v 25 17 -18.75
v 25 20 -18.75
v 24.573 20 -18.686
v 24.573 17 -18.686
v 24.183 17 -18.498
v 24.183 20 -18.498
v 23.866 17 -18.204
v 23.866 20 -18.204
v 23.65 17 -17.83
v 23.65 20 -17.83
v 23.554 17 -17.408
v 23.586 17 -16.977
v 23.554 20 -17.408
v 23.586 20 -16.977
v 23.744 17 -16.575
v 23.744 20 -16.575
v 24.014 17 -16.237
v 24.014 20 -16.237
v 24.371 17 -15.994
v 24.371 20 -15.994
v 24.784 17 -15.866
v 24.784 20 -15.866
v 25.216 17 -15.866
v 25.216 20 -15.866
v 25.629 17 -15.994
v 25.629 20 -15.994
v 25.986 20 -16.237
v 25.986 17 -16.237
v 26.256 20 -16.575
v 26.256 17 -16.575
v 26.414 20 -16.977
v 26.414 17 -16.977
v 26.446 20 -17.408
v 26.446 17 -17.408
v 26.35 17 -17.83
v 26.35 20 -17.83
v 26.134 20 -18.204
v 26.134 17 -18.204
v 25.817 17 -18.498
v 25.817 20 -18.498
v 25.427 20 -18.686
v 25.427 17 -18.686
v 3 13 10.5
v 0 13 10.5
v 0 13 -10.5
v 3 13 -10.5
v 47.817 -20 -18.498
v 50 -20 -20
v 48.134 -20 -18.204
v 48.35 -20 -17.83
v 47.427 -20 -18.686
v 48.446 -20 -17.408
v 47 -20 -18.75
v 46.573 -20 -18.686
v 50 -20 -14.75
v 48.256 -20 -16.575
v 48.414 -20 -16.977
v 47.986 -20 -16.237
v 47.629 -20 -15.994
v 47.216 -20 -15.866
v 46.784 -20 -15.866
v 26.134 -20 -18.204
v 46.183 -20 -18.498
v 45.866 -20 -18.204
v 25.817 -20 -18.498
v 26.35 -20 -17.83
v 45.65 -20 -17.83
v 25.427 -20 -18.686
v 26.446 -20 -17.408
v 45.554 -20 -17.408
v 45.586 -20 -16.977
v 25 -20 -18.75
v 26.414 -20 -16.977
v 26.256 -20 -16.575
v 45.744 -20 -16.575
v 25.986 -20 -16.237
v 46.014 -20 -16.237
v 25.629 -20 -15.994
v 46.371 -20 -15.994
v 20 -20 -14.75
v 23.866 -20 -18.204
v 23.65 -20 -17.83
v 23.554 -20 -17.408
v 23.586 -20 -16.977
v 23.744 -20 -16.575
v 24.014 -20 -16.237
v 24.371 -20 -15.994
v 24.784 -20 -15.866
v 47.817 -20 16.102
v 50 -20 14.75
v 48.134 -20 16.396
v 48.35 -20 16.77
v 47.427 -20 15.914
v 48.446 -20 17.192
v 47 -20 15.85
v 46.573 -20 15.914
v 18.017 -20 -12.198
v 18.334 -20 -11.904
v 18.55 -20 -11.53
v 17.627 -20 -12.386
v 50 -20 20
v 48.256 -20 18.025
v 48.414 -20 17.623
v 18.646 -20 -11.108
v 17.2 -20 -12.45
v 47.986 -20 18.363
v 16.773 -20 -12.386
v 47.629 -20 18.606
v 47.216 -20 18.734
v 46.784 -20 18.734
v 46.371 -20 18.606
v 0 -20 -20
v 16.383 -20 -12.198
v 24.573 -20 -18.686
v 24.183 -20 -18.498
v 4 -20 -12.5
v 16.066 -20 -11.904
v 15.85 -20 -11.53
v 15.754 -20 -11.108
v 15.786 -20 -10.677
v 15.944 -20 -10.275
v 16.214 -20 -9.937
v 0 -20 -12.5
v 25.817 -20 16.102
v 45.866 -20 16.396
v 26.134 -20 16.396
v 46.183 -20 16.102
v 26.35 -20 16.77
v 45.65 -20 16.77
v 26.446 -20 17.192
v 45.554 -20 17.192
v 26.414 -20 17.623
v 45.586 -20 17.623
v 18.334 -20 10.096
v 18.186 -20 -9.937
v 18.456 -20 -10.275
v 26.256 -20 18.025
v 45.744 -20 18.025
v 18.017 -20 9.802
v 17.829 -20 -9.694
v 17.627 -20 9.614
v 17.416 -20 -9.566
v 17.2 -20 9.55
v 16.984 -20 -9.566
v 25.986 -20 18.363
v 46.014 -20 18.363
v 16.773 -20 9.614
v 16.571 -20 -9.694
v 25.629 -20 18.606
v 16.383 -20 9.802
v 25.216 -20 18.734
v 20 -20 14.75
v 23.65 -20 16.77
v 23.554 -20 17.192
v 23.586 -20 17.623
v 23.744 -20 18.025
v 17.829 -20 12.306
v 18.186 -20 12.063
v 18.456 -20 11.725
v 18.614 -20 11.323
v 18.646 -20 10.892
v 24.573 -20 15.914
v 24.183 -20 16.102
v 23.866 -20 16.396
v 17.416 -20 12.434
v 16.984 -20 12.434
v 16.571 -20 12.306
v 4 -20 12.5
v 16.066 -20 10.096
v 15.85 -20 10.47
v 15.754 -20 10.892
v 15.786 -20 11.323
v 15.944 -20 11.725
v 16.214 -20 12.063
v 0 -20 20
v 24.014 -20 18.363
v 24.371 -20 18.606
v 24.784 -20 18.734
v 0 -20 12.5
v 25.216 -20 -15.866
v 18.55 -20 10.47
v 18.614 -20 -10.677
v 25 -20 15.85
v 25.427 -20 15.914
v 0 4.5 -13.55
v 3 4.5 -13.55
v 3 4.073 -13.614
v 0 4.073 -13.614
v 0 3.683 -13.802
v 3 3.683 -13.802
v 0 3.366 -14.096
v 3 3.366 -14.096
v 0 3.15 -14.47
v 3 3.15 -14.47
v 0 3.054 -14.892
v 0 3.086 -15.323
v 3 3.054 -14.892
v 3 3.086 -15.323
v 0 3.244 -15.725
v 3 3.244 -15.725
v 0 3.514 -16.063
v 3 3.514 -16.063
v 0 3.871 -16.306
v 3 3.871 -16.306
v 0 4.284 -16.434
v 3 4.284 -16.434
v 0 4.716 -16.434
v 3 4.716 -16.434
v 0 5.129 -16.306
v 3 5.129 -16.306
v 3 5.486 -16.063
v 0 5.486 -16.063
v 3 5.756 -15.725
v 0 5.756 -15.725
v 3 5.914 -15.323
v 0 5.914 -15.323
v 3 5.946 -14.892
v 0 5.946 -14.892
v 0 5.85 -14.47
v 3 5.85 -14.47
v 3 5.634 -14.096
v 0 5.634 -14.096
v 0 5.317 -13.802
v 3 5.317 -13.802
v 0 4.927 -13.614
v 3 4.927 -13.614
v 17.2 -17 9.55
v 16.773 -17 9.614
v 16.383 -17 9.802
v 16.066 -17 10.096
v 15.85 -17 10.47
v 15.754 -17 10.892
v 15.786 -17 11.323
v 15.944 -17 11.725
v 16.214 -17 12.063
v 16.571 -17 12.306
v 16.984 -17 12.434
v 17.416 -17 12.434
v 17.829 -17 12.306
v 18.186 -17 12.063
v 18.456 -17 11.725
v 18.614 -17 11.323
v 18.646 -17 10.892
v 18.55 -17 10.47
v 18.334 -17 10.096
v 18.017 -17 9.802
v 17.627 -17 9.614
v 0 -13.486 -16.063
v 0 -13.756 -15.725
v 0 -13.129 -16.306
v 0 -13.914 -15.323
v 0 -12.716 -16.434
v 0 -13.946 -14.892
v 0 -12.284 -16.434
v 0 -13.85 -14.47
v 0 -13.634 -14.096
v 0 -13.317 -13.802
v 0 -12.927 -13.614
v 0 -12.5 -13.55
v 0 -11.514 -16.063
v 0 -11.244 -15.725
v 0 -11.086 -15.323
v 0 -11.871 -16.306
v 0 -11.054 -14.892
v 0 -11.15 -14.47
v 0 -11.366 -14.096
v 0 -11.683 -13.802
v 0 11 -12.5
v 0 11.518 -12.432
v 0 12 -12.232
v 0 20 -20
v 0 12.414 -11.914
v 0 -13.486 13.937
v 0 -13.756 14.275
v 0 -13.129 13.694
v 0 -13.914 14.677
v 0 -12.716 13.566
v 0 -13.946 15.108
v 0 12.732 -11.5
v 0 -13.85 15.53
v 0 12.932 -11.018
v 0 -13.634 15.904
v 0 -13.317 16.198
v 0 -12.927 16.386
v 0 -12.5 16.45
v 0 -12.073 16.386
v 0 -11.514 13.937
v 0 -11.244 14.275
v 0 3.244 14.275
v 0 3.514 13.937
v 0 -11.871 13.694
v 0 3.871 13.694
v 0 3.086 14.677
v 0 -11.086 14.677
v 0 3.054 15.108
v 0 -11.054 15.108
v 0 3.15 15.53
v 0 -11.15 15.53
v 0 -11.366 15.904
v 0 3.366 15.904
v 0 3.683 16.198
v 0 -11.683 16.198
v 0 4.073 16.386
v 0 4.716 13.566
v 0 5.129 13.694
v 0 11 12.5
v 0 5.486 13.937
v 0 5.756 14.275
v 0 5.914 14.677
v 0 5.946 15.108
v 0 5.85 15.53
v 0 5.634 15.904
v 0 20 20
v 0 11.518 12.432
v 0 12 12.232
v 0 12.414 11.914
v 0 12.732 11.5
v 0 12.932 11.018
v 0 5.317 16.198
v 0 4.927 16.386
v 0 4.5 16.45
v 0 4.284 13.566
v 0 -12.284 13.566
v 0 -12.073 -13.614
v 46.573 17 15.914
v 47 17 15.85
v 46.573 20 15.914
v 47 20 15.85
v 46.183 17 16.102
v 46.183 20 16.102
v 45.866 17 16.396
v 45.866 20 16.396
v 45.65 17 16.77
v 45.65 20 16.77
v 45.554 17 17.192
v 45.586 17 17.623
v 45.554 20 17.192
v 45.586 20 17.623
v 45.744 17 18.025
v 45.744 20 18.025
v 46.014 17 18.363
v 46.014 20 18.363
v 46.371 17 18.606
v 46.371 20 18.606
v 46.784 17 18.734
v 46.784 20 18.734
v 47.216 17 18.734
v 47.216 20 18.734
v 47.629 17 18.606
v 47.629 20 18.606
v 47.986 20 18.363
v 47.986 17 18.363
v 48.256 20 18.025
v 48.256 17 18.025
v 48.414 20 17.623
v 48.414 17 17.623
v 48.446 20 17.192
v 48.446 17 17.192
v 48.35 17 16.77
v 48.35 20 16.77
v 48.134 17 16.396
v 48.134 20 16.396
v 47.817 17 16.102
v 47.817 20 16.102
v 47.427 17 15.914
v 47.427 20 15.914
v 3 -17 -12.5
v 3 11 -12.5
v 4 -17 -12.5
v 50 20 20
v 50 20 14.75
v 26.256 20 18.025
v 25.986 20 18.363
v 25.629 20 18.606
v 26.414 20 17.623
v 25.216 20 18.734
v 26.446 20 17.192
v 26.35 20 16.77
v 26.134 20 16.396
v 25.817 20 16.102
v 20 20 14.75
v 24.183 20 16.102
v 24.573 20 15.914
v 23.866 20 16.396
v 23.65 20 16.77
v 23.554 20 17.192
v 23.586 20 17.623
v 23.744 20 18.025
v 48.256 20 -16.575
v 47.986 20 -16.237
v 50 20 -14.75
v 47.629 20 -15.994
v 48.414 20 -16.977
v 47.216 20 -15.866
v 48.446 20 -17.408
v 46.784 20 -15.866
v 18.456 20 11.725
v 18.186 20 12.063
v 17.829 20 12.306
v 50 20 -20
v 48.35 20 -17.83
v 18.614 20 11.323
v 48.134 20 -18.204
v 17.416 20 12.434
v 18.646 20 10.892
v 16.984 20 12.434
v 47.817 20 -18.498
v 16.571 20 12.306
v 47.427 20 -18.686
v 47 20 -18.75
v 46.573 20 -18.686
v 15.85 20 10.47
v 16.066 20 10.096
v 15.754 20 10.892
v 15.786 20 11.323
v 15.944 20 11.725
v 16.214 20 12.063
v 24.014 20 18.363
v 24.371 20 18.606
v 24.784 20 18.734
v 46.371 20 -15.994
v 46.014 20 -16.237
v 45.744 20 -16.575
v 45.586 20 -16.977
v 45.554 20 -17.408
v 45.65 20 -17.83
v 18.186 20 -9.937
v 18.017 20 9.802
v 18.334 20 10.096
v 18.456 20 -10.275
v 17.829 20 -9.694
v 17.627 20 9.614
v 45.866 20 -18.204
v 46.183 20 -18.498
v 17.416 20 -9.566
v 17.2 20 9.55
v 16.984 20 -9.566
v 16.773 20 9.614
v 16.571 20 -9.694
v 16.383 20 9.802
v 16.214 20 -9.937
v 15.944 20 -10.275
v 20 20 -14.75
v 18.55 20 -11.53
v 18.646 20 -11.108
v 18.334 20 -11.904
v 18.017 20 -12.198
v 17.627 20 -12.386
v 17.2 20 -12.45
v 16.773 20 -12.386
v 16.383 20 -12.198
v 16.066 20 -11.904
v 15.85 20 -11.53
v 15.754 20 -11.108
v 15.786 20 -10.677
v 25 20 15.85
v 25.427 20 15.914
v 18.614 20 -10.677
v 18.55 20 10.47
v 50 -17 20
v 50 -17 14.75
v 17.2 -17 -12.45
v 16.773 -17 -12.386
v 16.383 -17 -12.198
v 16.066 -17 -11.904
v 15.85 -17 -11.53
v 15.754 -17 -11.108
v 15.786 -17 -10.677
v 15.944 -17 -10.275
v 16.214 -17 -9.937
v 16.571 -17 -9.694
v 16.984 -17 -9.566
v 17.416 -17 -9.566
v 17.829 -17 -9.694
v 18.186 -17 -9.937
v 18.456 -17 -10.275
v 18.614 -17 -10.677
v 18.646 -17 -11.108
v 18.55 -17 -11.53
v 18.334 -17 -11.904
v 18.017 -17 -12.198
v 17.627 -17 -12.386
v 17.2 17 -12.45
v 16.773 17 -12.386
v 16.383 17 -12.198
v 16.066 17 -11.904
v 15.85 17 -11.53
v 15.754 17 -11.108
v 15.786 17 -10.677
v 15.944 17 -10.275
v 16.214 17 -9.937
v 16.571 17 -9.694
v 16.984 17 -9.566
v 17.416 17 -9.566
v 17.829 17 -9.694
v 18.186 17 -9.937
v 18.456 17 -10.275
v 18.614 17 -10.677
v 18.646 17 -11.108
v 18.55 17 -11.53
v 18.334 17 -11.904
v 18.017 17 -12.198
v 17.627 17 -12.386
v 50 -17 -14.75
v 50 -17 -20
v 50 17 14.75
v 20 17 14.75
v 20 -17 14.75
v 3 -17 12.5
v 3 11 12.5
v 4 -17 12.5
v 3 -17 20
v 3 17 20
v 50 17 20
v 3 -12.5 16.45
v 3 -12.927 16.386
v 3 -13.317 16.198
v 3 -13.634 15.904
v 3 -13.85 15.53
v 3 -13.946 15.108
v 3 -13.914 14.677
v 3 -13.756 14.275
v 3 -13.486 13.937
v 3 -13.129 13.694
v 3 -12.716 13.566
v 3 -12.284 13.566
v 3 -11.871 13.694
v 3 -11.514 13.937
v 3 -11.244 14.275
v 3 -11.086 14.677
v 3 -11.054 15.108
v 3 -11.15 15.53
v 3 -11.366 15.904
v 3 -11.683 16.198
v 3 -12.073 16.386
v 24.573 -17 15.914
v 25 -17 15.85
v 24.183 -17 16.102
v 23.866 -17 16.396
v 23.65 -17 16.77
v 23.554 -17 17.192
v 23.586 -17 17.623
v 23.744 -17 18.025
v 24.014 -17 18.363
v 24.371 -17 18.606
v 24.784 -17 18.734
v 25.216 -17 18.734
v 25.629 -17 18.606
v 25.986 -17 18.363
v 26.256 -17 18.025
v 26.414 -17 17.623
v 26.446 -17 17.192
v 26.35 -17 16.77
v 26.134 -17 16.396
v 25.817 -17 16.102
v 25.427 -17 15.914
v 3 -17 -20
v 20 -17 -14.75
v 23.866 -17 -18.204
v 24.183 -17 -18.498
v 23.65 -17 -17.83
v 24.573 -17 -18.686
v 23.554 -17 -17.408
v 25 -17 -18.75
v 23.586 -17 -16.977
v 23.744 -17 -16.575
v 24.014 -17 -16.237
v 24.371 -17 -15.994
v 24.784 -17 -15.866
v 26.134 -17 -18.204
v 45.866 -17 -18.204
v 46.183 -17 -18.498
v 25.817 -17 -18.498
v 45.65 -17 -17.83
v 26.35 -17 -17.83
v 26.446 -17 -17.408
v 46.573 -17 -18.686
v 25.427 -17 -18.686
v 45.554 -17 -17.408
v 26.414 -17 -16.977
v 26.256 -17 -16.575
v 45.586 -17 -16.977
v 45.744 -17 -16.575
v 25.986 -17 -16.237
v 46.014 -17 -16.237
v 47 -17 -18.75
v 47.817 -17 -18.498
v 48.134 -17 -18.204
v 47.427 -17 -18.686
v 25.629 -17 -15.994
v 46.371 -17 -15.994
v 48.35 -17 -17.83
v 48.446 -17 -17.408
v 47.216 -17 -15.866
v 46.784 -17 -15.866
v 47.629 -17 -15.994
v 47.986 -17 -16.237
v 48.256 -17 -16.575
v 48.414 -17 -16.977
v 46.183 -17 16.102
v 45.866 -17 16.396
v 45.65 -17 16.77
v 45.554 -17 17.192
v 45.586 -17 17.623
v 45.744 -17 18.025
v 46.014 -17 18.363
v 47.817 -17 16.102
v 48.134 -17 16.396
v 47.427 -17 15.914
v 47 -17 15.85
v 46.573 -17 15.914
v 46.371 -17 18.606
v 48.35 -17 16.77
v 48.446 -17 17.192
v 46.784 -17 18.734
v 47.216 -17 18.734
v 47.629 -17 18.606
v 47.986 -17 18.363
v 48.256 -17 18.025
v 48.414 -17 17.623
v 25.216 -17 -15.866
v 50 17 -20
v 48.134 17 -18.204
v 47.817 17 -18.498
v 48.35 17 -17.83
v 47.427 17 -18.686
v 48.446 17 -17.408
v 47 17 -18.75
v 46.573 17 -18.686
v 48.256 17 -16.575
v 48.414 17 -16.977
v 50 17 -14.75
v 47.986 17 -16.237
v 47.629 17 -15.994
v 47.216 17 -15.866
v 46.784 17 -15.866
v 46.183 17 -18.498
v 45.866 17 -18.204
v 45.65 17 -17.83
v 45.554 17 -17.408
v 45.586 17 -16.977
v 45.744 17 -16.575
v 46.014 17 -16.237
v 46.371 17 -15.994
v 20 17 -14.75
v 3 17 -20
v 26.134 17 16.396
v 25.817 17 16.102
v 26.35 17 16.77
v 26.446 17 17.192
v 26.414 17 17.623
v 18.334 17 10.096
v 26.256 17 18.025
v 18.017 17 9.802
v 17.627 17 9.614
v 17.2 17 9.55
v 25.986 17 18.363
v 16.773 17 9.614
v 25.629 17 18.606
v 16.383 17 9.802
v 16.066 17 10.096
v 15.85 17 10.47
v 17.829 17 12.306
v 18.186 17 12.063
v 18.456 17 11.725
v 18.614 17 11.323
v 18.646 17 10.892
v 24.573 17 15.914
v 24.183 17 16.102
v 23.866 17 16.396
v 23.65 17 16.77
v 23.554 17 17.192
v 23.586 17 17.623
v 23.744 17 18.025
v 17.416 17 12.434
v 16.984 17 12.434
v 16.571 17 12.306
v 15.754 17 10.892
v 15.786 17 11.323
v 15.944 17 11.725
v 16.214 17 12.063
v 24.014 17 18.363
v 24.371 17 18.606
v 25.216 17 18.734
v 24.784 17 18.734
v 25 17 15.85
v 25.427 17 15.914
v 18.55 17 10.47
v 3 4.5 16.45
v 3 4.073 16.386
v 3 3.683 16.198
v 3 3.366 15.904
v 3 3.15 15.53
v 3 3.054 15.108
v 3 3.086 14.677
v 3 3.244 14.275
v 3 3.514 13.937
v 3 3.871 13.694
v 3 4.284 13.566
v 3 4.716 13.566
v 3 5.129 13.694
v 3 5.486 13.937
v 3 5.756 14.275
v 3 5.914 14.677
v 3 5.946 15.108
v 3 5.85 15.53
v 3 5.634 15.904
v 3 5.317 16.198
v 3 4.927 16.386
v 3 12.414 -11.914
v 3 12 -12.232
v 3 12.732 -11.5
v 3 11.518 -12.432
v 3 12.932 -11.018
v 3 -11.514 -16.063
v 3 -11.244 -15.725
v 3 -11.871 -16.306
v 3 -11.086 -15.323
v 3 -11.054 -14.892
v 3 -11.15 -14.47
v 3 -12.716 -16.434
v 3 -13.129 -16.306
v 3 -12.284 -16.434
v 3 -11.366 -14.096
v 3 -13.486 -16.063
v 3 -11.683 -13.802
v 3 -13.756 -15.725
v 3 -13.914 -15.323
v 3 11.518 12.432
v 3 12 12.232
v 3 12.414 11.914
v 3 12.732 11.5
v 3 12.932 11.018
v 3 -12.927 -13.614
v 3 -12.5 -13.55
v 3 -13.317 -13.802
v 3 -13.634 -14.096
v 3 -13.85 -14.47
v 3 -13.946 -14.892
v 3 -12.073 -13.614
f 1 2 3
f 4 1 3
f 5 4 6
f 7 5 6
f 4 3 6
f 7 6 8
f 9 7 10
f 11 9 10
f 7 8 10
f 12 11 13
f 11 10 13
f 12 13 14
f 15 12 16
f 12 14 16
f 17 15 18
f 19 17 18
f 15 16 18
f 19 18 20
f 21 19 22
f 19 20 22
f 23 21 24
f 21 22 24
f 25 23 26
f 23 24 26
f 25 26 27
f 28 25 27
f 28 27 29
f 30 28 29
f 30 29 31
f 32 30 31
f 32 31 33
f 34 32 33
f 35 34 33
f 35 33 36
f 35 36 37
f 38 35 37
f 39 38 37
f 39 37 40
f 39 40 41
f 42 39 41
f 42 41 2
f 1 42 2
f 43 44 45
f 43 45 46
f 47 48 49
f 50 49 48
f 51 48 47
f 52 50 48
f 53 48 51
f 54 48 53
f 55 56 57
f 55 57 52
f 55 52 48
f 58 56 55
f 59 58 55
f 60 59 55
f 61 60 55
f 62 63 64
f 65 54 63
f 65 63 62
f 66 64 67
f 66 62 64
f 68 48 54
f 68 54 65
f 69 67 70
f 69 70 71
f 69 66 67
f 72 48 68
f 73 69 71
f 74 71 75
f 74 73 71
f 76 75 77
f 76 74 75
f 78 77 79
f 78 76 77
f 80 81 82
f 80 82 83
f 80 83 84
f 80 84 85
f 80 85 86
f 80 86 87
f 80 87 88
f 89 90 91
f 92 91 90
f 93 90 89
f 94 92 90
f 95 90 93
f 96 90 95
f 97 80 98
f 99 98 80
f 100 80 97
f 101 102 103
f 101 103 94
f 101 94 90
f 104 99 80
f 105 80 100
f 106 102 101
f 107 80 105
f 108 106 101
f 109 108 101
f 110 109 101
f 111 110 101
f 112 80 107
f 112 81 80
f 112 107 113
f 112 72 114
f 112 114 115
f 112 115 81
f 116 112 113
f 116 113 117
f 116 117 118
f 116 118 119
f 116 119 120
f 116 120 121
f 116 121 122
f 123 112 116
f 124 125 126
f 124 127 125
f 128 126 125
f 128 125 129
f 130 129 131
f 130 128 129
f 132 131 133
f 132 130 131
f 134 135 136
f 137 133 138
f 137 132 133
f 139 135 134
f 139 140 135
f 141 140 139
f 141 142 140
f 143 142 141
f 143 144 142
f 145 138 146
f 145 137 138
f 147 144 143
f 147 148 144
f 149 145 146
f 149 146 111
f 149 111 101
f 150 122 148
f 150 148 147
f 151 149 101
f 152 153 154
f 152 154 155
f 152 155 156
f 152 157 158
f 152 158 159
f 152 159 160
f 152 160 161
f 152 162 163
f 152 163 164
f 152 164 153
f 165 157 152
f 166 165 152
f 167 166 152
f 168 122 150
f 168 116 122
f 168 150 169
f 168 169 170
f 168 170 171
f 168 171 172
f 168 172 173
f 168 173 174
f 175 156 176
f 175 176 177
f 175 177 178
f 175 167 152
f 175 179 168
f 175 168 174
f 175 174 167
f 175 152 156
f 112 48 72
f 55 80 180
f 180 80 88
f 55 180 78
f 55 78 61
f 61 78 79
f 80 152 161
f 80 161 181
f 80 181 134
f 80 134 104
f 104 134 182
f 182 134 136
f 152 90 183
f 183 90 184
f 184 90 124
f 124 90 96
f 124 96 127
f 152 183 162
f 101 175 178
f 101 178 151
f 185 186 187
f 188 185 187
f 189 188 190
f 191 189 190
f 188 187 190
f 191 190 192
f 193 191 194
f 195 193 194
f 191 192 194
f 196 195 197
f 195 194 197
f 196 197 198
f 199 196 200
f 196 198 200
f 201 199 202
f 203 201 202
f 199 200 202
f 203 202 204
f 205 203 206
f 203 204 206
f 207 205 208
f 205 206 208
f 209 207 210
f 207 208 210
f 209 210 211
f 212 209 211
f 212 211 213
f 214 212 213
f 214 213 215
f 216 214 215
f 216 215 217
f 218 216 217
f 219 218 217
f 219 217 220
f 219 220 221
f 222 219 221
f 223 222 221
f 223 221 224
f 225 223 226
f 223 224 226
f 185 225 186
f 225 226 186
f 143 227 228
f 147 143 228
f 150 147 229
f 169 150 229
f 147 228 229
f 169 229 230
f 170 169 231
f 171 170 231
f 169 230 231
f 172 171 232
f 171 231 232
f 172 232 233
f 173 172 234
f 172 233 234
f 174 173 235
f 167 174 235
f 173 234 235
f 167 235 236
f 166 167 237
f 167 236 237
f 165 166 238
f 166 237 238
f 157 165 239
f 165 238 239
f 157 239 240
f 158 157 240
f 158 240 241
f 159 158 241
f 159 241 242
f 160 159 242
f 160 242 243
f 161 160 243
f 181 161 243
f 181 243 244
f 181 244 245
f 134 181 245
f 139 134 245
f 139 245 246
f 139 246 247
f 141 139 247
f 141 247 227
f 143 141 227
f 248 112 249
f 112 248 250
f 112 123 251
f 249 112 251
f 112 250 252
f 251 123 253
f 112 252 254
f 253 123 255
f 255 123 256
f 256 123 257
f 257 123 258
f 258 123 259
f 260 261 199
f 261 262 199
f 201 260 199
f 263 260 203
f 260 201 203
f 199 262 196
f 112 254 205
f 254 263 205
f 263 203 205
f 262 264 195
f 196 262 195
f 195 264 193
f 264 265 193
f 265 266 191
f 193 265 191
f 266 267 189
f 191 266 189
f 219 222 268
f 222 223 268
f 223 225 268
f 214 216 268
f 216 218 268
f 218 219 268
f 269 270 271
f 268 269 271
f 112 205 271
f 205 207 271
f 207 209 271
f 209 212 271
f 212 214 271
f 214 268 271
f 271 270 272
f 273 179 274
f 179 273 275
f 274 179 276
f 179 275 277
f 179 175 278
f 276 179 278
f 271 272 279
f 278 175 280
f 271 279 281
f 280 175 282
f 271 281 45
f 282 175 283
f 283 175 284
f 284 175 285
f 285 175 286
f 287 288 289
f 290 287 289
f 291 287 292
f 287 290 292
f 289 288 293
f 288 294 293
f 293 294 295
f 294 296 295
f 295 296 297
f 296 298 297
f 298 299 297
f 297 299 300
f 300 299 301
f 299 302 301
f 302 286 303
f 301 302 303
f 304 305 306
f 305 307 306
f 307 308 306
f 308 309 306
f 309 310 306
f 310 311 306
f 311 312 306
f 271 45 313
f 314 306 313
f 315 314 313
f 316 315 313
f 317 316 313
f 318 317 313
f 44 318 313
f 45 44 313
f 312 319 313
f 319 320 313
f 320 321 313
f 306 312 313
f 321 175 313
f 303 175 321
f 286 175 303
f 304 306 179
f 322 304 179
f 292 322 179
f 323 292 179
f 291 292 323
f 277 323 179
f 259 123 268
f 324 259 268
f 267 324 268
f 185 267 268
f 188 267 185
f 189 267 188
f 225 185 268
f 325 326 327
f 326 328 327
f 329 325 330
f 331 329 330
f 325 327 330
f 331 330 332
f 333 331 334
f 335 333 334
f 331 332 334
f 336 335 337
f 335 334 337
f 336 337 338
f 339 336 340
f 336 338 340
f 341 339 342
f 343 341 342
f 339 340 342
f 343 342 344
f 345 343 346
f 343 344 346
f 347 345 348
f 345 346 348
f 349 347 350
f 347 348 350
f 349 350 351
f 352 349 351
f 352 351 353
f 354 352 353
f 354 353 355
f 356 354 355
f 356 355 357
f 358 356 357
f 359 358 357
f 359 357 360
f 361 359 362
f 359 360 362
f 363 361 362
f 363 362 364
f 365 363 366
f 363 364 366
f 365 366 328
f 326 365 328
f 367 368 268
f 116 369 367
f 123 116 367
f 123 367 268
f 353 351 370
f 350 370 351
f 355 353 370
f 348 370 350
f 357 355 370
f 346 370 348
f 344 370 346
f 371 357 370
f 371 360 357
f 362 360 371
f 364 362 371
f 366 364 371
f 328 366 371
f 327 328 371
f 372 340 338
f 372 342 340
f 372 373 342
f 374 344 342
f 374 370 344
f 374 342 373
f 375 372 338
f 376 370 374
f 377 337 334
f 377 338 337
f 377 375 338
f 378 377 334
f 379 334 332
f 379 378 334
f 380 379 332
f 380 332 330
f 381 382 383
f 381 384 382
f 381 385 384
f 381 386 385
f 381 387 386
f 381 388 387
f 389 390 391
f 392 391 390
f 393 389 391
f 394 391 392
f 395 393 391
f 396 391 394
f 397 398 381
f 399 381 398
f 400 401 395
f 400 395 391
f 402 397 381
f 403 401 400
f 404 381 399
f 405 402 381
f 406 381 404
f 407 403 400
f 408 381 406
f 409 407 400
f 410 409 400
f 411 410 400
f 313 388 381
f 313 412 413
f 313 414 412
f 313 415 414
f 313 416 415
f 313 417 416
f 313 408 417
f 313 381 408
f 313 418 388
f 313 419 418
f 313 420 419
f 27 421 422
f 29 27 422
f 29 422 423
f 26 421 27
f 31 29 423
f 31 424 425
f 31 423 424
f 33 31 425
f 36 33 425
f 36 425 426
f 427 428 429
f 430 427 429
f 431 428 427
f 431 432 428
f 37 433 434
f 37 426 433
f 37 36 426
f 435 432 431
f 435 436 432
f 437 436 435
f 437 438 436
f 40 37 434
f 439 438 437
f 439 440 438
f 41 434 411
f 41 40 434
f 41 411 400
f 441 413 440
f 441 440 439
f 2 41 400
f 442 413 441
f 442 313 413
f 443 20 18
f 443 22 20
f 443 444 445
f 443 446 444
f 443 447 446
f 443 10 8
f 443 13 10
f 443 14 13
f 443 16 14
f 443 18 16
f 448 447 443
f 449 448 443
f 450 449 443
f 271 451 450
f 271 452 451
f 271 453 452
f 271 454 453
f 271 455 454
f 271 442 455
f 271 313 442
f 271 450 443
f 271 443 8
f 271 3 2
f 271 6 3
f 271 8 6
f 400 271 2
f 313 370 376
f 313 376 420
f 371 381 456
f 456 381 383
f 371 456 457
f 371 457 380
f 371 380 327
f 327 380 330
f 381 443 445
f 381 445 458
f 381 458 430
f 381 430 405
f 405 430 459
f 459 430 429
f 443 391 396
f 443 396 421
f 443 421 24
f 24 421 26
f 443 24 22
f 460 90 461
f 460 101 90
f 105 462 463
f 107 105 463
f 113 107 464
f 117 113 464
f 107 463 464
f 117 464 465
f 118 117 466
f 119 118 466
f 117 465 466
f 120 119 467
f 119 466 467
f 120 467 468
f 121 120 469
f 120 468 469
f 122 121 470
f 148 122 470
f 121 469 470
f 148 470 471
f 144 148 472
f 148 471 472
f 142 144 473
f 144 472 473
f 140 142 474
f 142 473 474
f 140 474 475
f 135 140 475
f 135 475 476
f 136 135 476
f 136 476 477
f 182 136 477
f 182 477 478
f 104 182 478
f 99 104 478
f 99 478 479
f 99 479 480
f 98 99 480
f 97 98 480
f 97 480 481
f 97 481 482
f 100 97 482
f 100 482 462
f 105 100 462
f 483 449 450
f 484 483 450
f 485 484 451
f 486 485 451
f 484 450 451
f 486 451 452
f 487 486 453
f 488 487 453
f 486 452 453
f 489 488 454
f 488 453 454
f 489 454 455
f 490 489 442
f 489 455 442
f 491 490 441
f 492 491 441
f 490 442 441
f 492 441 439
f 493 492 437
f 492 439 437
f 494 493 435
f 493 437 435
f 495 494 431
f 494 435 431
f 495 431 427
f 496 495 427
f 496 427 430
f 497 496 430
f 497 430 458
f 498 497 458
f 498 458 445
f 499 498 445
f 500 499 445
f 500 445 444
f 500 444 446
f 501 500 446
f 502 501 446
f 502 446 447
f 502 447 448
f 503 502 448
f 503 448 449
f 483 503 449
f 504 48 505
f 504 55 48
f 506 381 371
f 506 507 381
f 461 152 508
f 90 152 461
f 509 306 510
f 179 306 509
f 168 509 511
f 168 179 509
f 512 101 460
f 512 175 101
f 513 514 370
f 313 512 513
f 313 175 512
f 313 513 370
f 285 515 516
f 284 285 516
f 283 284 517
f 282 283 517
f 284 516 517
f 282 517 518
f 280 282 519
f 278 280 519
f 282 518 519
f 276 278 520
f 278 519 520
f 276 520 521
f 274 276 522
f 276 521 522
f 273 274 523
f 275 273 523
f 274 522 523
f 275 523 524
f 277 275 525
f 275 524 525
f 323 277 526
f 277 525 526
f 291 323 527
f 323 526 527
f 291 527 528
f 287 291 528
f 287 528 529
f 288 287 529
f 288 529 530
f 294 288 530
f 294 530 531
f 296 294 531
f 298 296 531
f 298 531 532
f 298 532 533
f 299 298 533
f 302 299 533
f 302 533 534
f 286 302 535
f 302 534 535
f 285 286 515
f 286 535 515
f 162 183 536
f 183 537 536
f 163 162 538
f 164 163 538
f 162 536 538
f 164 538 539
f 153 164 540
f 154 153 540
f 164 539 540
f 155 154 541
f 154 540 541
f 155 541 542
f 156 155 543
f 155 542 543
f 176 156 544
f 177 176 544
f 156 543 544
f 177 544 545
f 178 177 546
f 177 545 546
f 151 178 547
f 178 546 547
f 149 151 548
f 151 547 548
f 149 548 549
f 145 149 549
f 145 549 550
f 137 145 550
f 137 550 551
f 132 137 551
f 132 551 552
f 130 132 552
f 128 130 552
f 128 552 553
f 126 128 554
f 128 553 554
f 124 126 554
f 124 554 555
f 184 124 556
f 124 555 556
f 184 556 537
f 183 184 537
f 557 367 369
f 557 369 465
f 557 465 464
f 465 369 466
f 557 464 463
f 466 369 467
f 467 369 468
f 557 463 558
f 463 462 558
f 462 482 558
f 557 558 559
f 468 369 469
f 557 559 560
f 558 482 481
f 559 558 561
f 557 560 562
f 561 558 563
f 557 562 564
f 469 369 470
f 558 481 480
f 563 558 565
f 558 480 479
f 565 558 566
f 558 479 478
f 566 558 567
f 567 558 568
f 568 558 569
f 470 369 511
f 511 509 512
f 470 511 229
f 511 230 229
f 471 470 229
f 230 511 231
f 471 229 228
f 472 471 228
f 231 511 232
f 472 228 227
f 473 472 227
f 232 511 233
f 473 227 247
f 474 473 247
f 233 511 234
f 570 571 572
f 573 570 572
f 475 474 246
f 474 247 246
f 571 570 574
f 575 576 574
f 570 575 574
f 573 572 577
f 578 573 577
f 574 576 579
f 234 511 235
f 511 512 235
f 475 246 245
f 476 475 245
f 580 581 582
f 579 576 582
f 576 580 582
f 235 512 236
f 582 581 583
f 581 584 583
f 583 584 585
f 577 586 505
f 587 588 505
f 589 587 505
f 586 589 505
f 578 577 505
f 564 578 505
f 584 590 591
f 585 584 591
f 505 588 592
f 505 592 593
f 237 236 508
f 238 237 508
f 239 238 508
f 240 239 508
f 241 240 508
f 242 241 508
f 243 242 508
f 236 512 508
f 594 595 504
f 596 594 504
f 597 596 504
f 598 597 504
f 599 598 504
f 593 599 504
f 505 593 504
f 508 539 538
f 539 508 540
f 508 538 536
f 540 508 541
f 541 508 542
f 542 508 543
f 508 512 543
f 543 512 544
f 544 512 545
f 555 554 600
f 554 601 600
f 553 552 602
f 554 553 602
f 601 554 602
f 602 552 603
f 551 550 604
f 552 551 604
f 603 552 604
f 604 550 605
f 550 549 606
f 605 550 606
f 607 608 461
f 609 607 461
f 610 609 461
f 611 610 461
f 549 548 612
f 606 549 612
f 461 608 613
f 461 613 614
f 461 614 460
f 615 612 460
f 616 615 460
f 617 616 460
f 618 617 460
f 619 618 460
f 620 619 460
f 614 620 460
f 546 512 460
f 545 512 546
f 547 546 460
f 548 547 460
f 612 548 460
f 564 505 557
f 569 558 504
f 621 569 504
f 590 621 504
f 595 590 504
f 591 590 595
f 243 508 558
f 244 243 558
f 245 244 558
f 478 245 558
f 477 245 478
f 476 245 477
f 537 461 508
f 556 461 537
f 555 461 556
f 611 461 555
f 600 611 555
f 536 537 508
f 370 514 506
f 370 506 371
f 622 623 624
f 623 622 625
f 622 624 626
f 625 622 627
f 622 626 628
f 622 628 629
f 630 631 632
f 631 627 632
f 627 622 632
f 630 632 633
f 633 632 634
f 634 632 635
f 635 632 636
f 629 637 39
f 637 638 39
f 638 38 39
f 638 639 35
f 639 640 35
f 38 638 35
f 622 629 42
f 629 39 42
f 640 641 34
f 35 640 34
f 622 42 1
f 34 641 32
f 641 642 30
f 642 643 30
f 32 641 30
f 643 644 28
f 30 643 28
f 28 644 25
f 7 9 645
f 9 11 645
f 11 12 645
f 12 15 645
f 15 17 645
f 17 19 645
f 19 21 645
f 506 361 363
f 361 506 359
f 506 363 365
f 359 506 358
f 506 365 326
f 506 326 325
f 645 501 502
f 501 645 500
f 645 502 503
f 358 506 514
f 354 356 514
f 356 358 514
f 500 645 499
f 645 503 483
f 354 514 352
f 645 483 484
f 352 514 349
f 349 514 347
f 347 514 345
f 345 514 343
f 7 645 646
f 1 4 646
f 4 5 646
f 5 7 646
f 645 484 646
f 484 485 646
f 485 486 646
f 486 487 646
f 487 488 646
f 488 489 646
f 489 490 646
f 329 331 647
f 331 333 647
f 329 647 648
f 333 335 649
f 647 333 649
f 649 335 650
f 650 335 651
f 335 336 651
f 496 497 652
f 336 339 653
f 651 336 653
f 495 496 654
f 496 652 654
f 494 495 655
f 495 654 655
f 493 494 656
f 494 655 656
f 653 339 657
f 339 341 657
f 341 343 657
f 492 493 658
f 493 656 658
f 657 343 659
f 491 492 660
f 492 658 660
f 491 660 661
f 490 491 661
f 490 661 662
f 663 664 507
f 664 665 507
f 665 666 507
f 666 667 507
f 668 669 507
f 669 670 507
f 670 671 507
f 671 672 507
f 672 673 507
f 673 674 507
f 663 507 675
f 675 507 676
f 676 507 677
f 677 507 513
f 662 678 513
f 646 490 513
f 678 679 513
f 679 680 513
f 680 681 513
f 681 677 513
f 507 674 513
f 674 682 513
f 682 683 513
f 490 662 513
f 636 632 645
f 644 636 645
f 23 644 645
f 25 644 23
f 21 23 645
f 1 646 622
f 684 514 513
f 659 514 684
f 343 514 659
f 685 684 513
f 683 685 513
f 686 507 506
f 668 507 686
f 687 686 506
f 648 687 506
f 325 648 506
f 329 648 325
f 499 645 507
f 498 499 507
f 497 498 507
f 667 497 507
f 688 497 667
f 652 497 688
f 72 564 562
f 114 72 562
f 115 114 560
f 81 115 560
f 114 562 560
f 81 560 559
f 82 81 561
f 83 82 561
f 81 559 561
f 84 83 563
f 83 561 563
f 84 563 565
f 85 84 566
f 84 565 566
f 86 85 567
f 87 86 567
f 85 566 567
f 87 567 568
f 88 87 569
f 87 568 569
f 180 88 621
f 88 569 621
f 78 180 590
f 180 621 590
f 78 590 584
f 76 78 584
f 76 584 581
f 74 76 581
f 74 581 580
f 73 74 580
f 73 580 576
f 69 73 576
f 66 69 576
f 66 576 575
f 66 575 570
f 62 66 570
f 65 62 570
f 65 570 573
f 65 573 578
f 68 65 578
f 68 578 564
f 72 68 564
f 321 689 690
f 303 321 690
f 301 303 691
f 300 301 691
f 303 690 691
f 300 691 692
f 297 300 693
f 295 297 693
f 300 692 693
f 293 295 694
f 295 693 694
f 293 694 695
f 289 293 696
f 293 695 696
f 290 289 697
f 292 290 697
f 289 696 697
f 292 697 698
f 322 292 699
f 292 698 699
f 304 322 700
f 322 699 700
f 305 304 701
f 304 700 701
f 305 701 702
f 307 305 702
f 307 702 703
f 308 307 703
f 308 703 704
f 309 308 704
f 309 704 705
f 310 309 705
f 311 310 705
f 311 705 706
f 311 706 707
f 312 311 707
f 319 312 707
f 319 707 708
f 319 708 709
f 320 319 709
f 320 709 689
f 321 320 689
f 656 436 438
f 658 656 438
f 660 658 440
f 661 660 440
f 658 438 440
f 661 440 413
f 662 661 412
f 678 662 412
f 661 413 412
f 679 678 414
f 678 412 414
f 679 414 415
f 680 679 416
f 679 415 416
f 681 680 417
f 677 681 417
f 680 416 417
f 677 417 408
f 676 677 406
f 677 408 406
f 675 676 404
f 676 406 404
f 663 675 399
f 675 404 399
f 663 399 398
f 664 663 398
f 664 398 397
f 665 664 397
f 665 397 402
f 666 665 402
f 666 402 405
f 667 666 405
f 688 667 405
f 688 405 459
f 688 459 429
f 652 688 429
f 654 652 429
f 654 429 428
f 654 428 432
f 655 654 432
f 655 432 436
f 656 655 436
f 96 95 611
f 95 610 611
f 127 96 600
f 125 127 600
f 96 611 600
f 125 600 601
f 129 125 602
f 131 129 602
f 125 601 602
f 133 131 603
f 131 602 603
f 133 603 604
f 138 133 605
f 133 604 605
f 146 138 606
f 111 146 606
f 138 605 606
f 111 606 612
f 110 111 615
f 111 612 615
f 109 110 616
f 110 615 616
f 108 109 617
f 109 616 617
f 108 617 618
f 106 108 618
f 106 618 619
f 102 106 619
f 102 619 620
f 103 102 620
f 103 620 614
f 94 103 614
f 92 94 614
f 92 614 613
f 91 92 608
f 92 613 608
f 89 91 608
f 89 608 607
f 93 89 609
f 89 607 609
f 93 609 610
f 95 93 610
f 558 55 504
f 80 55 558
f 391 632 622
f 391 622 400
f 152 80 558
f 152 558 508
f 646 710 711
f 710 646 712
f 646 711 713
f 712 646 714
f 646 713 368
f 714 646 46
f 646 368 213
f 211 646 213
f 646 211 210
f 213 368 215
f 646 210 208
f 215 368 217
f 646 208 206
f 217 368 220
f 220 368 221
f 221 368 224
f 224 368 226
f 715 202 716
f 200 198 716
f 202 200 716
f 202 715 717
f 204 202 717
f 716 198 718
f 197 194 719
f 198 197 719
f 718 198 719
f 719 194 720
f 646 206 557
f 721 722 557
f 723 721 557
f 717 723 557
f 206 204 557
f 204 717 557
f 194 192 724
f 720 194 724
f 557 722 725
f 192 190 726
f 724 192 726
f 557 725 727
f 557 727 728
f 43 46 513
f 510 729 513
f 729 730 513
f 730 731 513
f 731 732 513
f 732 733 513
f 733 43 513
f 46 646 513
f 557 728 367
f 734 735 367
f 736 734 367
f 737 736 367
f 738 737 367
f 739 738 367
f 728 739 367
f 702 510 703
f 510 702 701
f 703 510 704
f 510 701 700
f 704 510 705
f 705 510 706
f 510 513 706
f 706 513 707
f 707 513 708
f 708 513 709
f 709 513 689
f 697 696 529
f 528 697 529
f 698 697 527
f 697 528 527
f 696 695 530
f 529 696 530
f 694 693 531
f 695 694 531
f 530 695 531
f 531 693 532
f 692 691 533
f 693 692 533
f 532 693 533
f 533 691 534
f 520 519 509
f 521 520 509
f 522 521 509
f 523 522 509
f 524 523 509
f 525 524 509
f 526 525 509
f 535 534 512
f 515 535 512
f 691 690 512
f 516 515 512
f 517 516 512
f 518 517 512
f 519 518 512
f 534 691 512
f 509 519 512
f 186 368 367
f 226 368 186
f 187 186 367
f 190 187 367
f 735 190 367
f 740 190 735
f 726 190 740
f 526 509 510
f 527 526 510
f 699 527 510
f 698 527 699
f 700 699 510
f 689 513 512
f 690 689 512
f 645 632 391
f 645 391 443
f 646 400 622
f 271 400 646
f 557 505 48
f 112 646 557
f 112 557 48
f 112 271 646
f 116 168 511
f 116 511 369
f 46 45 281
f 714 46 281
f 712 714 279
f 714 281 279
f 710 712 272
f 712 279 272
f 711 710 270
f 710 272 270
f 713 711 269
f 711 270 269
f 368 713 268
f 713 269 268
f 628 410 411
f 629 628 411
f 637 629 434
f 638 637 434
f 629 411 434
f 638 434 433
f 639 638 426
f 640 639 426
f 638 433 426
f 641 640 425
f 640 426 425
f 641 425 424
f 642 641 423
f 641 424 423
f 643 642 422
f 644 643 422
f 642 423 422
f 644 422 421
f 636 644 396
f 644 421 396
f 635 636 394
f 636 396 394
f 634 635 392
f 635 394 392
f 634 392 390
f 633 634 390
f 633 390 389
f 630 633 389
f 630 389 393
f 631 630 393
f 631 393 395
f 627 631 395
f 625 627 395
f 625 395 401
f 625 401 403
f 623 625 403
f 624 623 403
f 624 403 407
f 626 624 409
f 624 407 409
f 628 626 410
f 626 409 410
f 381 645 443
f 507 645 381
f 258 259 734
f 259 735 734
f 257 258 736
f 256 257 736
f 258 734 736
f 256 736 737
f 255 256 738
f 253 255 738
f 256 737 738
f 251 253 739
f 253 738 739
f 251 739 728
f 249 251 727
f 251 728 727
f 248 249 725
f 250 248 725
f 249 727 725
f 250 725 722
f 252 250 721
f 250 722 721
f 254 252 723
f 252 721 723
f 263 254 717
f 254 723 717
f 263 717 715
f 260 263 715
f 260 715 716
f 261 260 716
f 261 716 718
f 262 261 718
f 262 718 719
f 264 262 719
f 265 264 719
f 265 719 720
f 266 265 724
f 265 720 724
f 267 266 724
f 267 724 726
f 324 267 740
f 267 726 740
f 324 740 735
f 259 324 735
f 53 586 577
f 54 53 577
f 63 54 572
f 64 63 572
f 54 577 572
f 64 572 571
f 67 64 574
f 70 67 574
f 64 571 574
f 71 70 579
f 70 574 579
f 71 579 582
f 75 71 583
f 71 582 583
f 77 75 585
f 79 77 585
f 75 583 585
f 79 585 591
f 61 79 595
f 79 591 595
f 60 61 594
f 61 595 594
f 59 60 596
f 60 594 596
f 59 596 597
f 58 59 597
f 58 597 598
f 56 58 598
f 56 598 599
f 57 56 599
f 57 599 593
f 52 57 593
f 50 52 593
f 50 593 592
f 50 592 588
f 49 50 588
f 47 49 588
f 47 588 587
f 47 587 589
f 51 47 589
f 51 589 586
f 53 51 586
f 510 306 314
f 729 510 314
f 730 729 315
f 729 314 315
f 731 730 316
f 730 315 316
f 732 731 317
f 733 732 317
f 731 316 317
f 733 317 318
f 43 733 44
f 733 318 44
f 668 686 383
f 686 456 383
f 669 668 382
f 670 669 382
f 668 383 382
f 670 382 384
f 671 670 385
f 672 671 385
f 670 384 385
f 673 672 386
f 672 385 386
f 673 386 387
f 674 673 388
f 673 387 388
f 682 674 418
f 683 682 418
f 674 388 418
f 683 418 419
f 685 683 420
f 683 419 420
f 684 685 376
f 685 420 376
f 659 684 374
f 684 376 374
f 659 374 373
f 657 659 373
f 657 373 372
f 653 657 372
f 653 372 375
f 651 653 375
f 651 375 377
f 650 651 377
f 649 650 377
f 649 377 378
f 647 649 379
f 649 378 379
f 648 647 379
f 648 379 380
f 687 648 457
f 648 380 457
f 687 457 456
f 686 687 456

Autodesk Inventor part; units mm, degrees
ref_plane "YZ Plane" through (0, 0, 0) normal (1, 0, 0) x (0, 1, 0)
ref_plane "XZ Plane" through (0, 0, 0) normal (0, 1, 0) x (-1, 0, 0)
ref_plane "XY Plane" through (0, 0, 0) normal (0, 0, 1) x (1, 0, 0)
sketch "Skizze1" plane through (0, 0, 0) normal (1, 0, 0) x (0, 1, 0)
  line L0 (-20, 20) -> (20, 20)
  line L1 (20, 20) -> (20, -20)
  line L2 (20, -20) -> (-20, -20)
  line L3 (-20, -20) -> (-20, 20)
  line L4 (-20, 20) -> (20, -20) construction
  line L5 (20, 20) -> (-20, -20) construction
  point P0 (0, 0)
  dimension "d0" = 40
  dimension "d1" = 40
extrude "Extrusion1" add sketch "Skizze1" along normal blind 50
sketch "Skizze2" plane through (0, -20, 20) normal (0, 0, 1) x (1, 0, 0)
  line L0 (0, 0) -> (0, 40) projected
  line L1 (0, 0) -> (50, 0) projected
  line L2 (50, 40) -> (50, 0) projected
  line L3 (0, 40) -> (50, 40) projected
  line L4 (50, 40) -> (50, 0) projected
  line L5 (50, 37) -> (3, 37)
  line L6 (3, 37) -> (3, 3)
  line L7 (3, 3) -> (50, 3)
  line L8 (50, 3) -> (50, 37)
  point P0 (0, 20)
  dimension "d4" = 3
  dimension "d5" = 3
  dimension "d6" = 3
extrude "Extrusion2" cut sketch "Skizze2" against normal through all contours L7 L6 L5 L2
sketch "Skizze3" plane through (0, -20, -20) normal (0, -1, 0) x (1, 0, 0)
  line L0 (0, 0) -> (0, 40) projected
  line L1 (0, 0) -> (50, 0) projected
  line L2 (50, 40) -> (50, 0) projected
  line L3 (0, 40) -> (50, 40) projected
  line L4 (0, 20) -> (44.7617, 20) construction
  line L5 (20, 34.75) -> (50, 34.75)
  line L6 (50, 34.75) -> (50, 5.25)
  line L7 (50, 5.25) -> (20, 5.25)
  line L8 (20, 5.25) -> (20, 34.75)
  line L9 (20, 34.75) -> (50, 5.25) construction
  line L10 (50, 34.75) -> (20, 5.25) construction
  point P0 (35, 20)
  dimension "d9" = 29.5
  dimension "d10" = 30
extrude "Extrusion3" cut sketch "Skizze3" against normal blind 40 contours L7 L8 L5 L2
sketch "Skizze4" plane through (0, -20, -20) normal (0, -1, 0) x (1, 0, 0)
  line L0 (50, 5.25) -> (20, 5.25) projected
  line L1 (20, 5.25) -> (20, 34.75) projected
  line L2 (20, 34.75) -> (50, 34.75) projected
  line L3 (50, 40) -> (50, 34.75) projected
  line L4 (0, 40) -> (50, 40) projected
  line L5 (0, 0) -> (0, 40) projected
  line L6 (0, 0) -> (50, 0) projected
  line L7 (50, 5.25) -> (50, 0) projected
  line L8 (0, 20) -> (84.4351, 20) construction
  point P0 (25, 37.3)
  point P1 (25, 2.7)
  point P2 (17.2, 31)
  point P3 (17.2, 9)
  point P4 (47, 37.3)
  point P5 (47, 2.7)
  dimension "d13" = 5
  dimension "d14" = 5
  dimension "d15" = 34.6
  dimension "d16" = 17.3
  dimension "d17" = 22
  dimension "d18" = 11
  dimension "d19" = 2.8
  dimension "d20" = 2.8
  dimension "d47" = 17.3
  dimension "d48" = 17.3
  dimension "d49" = 22
  dimension "d50" = 22
hole "Bohrung1" at (25, -20, 17.3) at (25, -20, -17.3) at (17.2, -20, 11) at (17.2, -20, -11) at (47, -20, 17.3) at (47, -20, -17.3) direction (0, 1, 0) diameter 2.9 end through all clearance for "Inbusschraube ISO 4762" size "M2.5" standard "ISO"
sketch "Skizze5" plane through (0, -20, -20) normal (0, -1, 0) x (1, 0, 0)
  line L0 (-4, 32.5) -> (4, 32.5)
  line L1 (4, 32.5) -> (4, 7.5)
  line L2 (4, 7.5) -> (-4, 7.5)
  line L3 (-4, 7.5) -> (-4, 32.5)
  line L4 (-4, 32.5) -> (4, 7.5) construction
  line L5 (4, 32.5) -> (-4, 7.5) construction
  circle A0 centre (17.2, 31) radius 1.45 projected
  circle A1 centre (25, 37.3) radius 1.45 projected
  circle A2 centre (25, 2.7) radius 1.45 projected
  circle A3 centre (17.2, 9) radius 1.45 projected
  line L6 (50, 5.25) -> (20, 5.25) projected
  line L7 (20, 5.25) -> (20, 34.75) projected
  line L8 (20, 34.75) -> (50, 34.75) projected
  line L9 (50, 40) -> (50, 34.75) projected
  line L10 (0, 40) -> (50, 40) projected
  line L11 (0, 0) -> (0, 40) projected
  line L12 (0, 0) -> (50, 0) projected
  line L13 (50, 5.25) -> (50, 0) projected
  point P0 (0, 20)
  dimension "d28" = 25
  dimension "d30" = 4
extrude "Extrusion4" cut sketch "Skizze5" against normal blind 33 contours L0 L11 L2 L3 | L0 L1 L2 L11
sketch "Skizze6" plane through (0, 0, 0) normal (-1, 0, 0) x (0, 0, 1)
  line L0 (0, -27.3201) -> (0, 32.8288) construction
  line L1 (-15, -12.5) -> (15, -12.5) construction
  line L2 (15, -12.5) -> (15, 4.5) construction
  line L3 (15, 4.5) -> (-15, 4.5) construction
  line L4 (-15, 4.5) -> (-15, -12.5) construction
  line L5 (-15, -12.5) -> (15, 4.5) construction
  line L6 (15, -12.5) -> (-15, 4.5) construction
  point P0 (0, 0)
  point P1 (0, -4)
  dimension "d34" = 17
  dimension "d44" = 4
  dimension "d45" = 30
hole "Bohrung2" at (0, 4.5, -15) at (0, -12.5, -15) at (0, 4.5, 15) at (0, -12.5, 15) direction (1, 0, 0) diameter 2.9 end through all clearance for "Inbusschraube ISO 4762" size "M2.5" standard "ISO"
fillet "Rundung1" radius 2 2 edges at (1.5, 13, 12.5) (1.5, 13, -12.5)
equation "\"d5\" = d4"
equation "\"d13\" = d14"
equation "\"d16\" = 0.5 * d15"
equation "\"d18\" = 0.5 * d17"
equation "\"d20\" = d19"
equation "\"d47\" = d16"
equation "\"d48\" = d16"
equation "\"d50\" = d49"
properties part number "connection_linkFour" material "Aluminium 6061"
